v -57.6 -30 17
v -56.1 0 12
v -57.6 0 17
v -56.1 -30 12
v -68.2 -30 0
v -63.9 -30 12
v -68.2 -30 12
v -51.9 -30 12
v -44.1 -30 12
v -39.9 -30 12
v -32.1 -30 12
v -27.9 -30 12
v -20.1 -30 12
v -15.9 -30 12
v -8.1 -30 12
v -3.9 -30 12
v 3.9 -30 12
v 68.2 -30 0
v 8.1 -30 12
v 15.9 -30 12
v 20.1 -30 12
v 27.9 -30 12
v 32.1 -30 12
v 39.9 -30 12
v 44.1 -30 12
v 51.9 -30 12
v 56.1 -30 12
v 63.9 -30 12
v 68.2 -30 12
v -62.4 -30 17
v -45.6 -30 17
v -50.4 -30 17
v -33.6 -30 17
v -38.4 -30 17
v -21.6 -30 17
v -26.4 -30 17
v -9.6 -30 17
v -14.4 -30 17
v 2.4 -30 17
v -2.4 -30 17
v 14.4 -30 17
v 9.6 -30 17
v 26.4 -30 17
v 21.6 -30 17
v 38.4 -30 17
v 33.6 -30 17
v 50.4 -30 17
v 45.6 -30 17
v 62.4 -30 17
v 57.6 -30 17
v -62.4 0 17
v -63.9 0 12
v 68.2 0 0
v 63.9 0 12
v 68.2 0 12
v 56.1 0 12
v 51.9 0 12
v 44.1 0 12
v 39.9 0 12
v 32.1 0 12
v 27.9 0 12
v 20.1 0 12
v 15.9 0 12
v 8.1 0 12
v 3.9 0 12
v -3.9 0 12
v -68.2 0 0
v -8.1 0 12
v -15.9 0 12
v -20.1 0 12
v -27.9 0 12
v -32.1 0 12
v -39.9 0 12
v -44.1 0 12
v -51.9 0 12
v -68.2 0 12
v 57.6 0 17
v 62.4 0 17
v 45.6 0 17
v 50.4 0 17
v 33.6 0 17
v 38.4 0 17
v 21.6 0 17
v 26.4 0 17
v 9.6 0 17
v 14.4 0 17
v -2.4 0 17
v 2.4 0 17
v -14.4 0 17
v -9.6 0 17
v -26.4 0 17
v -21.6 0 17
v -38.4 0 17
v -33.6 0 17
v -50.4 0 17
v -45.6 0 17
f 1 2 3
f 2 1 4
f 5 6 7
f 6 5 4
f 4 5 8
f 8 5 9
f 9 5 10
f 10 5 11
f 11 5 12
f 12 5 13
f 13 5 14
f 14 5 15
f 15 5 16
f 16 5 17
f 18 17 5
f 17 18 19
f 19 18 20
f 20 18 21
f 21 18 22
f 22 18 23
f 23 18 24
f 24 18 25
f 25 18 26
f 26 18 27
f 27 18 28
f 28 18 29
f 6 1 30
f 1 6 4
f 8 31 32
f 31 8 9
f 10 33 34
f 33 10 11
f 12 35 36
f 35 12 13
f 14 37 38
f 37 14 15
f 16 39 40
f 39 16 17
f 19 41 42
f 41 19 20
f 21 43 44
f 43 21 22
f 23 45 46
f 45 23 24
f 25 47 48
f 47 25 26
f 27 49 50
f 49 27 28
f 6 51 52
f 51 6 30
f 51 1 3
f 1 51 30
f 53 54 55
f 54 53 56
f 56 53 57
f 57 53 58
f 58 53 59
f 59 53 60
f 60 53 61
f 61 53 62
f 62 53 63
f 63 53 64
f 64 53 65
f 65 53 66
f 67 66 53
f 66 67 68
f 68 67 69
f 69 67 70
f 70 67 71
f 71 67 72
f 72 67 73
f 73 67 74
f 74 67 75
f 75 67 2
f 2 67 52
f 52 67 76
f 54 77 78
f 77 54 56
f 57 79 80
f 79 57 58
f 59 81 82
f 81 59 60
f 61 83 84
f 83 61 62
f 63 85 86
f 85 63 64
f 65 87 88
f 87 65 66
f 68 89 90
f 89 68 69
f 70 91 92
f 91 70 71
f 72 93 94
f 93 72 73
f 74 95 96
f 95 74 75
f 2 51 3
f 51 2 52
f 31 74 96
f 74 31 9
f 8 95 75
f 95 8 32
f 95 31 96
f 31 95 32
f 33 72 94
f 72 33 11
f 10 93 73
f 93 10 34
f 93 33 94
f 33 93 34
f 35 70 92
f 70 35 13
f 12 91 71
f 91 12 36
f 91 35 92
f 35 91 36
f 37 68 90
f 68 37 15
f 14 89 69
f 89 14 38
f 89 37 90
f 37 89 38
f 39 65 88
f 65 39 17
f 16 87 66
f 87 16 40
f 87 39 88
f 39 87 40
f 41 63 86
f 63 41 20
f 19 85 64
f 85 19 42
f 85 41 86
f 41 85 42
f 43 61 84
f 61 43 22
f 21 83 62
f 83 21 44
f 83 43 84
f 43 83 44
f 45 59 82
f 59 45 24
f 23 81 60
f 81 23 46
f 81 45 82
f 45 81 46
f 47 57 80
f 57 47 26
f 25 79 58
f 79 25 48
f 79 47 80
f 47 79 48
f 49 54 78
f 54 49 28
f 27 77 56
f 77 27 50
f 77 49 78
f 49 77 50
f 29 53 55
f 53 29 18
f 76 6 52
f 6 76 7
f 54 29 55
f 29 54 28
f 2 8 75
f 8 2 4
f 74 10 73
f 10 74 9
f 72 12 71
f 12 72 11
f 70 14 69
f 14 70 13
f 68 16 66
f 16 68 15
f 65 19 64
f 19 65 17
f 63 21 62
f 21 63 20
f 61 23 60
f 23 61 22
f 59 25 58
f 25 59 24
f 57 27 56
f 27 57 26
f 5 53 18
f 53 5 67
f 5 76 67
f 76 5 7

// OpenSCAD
$fn = 32;

// ----------------------------------------------------------------------
// Toothed rack, 11 teeth
// 12 mm pitch, 5 mm teeth
// ----------------------------------------------------------------------

// --- parameters (mm) ---
bar_w = 30;     // bar width (Y)
bar_h = 12;     // bar height (Z)
teeth = 11;     // number of teeth
pitch = 12;     // tooth pitch
tooth_h = 5;    // tooth height above the bar
root_w = 8.4;   // tooth width at the root
crest_w = 4.8;  // tooth width at the crest

// --- derived feature positions (mm) ---
span = (teeth - 1) * pitch;  // = 120   distance between the outer teeth
bar_l = span + root_w + 8;   // = 136.4   bar length: teeth plus 4 mm at each end
tooth_x = -span / 2;         // = -60   X of the first tooth
height = bar_h + tooth_h;    // = 17   overall height
feature_centers = [
  [tooth_x + 0 * pitch, -bar_w / 2],
  [tooth_x + 1 * pitch, -bar_w / 2],
  [tooth_x + 2 * pitch, -bar_w / 2],
  [tooth_x + 3 * pitch, -bar_w / 2],
  [tooth_x + 4 * pitch, -bar_w / 2],
  [tooth_x + 5 * pitch, -bar_w / 2],
  [tooth_x + 6 * pitch, -bar_w / 2],
  [tooth_x + 7 * pitch, -bar_w / 2],
  [tooth_x + 8 * pitch, -bar_w / 2],
  [tooth_x + 9 * pitch, -bar_w / 2],
  [tooth_x + 10 * pitch, -bar_w / 2]
];   // tooth centre line, drives the tooth loop

// bar with a rack of teeth, one extruded trapezoium per centre
module rack_tooth() {
  linear_extrude(height = bar_w)
    polygon(points = [
      [0, 0],
      [root_w, 0],
      [root_w / 2 + crest_w / 2, tooth_h + 1],
      [root_w / 2 - crest_w / 2, tooth_h + 1]
    ]);
}

union() {
  translate([-bar_l / 2, -bar_w, 0]) cube([bar_l, bar_w, bar_h]);
  for (centre = feature_centers)
    translate([centre[0] - root_w / 2, 0, bar_h - 1]) rotate([90, 0, 0]) rack_tooth();
}
